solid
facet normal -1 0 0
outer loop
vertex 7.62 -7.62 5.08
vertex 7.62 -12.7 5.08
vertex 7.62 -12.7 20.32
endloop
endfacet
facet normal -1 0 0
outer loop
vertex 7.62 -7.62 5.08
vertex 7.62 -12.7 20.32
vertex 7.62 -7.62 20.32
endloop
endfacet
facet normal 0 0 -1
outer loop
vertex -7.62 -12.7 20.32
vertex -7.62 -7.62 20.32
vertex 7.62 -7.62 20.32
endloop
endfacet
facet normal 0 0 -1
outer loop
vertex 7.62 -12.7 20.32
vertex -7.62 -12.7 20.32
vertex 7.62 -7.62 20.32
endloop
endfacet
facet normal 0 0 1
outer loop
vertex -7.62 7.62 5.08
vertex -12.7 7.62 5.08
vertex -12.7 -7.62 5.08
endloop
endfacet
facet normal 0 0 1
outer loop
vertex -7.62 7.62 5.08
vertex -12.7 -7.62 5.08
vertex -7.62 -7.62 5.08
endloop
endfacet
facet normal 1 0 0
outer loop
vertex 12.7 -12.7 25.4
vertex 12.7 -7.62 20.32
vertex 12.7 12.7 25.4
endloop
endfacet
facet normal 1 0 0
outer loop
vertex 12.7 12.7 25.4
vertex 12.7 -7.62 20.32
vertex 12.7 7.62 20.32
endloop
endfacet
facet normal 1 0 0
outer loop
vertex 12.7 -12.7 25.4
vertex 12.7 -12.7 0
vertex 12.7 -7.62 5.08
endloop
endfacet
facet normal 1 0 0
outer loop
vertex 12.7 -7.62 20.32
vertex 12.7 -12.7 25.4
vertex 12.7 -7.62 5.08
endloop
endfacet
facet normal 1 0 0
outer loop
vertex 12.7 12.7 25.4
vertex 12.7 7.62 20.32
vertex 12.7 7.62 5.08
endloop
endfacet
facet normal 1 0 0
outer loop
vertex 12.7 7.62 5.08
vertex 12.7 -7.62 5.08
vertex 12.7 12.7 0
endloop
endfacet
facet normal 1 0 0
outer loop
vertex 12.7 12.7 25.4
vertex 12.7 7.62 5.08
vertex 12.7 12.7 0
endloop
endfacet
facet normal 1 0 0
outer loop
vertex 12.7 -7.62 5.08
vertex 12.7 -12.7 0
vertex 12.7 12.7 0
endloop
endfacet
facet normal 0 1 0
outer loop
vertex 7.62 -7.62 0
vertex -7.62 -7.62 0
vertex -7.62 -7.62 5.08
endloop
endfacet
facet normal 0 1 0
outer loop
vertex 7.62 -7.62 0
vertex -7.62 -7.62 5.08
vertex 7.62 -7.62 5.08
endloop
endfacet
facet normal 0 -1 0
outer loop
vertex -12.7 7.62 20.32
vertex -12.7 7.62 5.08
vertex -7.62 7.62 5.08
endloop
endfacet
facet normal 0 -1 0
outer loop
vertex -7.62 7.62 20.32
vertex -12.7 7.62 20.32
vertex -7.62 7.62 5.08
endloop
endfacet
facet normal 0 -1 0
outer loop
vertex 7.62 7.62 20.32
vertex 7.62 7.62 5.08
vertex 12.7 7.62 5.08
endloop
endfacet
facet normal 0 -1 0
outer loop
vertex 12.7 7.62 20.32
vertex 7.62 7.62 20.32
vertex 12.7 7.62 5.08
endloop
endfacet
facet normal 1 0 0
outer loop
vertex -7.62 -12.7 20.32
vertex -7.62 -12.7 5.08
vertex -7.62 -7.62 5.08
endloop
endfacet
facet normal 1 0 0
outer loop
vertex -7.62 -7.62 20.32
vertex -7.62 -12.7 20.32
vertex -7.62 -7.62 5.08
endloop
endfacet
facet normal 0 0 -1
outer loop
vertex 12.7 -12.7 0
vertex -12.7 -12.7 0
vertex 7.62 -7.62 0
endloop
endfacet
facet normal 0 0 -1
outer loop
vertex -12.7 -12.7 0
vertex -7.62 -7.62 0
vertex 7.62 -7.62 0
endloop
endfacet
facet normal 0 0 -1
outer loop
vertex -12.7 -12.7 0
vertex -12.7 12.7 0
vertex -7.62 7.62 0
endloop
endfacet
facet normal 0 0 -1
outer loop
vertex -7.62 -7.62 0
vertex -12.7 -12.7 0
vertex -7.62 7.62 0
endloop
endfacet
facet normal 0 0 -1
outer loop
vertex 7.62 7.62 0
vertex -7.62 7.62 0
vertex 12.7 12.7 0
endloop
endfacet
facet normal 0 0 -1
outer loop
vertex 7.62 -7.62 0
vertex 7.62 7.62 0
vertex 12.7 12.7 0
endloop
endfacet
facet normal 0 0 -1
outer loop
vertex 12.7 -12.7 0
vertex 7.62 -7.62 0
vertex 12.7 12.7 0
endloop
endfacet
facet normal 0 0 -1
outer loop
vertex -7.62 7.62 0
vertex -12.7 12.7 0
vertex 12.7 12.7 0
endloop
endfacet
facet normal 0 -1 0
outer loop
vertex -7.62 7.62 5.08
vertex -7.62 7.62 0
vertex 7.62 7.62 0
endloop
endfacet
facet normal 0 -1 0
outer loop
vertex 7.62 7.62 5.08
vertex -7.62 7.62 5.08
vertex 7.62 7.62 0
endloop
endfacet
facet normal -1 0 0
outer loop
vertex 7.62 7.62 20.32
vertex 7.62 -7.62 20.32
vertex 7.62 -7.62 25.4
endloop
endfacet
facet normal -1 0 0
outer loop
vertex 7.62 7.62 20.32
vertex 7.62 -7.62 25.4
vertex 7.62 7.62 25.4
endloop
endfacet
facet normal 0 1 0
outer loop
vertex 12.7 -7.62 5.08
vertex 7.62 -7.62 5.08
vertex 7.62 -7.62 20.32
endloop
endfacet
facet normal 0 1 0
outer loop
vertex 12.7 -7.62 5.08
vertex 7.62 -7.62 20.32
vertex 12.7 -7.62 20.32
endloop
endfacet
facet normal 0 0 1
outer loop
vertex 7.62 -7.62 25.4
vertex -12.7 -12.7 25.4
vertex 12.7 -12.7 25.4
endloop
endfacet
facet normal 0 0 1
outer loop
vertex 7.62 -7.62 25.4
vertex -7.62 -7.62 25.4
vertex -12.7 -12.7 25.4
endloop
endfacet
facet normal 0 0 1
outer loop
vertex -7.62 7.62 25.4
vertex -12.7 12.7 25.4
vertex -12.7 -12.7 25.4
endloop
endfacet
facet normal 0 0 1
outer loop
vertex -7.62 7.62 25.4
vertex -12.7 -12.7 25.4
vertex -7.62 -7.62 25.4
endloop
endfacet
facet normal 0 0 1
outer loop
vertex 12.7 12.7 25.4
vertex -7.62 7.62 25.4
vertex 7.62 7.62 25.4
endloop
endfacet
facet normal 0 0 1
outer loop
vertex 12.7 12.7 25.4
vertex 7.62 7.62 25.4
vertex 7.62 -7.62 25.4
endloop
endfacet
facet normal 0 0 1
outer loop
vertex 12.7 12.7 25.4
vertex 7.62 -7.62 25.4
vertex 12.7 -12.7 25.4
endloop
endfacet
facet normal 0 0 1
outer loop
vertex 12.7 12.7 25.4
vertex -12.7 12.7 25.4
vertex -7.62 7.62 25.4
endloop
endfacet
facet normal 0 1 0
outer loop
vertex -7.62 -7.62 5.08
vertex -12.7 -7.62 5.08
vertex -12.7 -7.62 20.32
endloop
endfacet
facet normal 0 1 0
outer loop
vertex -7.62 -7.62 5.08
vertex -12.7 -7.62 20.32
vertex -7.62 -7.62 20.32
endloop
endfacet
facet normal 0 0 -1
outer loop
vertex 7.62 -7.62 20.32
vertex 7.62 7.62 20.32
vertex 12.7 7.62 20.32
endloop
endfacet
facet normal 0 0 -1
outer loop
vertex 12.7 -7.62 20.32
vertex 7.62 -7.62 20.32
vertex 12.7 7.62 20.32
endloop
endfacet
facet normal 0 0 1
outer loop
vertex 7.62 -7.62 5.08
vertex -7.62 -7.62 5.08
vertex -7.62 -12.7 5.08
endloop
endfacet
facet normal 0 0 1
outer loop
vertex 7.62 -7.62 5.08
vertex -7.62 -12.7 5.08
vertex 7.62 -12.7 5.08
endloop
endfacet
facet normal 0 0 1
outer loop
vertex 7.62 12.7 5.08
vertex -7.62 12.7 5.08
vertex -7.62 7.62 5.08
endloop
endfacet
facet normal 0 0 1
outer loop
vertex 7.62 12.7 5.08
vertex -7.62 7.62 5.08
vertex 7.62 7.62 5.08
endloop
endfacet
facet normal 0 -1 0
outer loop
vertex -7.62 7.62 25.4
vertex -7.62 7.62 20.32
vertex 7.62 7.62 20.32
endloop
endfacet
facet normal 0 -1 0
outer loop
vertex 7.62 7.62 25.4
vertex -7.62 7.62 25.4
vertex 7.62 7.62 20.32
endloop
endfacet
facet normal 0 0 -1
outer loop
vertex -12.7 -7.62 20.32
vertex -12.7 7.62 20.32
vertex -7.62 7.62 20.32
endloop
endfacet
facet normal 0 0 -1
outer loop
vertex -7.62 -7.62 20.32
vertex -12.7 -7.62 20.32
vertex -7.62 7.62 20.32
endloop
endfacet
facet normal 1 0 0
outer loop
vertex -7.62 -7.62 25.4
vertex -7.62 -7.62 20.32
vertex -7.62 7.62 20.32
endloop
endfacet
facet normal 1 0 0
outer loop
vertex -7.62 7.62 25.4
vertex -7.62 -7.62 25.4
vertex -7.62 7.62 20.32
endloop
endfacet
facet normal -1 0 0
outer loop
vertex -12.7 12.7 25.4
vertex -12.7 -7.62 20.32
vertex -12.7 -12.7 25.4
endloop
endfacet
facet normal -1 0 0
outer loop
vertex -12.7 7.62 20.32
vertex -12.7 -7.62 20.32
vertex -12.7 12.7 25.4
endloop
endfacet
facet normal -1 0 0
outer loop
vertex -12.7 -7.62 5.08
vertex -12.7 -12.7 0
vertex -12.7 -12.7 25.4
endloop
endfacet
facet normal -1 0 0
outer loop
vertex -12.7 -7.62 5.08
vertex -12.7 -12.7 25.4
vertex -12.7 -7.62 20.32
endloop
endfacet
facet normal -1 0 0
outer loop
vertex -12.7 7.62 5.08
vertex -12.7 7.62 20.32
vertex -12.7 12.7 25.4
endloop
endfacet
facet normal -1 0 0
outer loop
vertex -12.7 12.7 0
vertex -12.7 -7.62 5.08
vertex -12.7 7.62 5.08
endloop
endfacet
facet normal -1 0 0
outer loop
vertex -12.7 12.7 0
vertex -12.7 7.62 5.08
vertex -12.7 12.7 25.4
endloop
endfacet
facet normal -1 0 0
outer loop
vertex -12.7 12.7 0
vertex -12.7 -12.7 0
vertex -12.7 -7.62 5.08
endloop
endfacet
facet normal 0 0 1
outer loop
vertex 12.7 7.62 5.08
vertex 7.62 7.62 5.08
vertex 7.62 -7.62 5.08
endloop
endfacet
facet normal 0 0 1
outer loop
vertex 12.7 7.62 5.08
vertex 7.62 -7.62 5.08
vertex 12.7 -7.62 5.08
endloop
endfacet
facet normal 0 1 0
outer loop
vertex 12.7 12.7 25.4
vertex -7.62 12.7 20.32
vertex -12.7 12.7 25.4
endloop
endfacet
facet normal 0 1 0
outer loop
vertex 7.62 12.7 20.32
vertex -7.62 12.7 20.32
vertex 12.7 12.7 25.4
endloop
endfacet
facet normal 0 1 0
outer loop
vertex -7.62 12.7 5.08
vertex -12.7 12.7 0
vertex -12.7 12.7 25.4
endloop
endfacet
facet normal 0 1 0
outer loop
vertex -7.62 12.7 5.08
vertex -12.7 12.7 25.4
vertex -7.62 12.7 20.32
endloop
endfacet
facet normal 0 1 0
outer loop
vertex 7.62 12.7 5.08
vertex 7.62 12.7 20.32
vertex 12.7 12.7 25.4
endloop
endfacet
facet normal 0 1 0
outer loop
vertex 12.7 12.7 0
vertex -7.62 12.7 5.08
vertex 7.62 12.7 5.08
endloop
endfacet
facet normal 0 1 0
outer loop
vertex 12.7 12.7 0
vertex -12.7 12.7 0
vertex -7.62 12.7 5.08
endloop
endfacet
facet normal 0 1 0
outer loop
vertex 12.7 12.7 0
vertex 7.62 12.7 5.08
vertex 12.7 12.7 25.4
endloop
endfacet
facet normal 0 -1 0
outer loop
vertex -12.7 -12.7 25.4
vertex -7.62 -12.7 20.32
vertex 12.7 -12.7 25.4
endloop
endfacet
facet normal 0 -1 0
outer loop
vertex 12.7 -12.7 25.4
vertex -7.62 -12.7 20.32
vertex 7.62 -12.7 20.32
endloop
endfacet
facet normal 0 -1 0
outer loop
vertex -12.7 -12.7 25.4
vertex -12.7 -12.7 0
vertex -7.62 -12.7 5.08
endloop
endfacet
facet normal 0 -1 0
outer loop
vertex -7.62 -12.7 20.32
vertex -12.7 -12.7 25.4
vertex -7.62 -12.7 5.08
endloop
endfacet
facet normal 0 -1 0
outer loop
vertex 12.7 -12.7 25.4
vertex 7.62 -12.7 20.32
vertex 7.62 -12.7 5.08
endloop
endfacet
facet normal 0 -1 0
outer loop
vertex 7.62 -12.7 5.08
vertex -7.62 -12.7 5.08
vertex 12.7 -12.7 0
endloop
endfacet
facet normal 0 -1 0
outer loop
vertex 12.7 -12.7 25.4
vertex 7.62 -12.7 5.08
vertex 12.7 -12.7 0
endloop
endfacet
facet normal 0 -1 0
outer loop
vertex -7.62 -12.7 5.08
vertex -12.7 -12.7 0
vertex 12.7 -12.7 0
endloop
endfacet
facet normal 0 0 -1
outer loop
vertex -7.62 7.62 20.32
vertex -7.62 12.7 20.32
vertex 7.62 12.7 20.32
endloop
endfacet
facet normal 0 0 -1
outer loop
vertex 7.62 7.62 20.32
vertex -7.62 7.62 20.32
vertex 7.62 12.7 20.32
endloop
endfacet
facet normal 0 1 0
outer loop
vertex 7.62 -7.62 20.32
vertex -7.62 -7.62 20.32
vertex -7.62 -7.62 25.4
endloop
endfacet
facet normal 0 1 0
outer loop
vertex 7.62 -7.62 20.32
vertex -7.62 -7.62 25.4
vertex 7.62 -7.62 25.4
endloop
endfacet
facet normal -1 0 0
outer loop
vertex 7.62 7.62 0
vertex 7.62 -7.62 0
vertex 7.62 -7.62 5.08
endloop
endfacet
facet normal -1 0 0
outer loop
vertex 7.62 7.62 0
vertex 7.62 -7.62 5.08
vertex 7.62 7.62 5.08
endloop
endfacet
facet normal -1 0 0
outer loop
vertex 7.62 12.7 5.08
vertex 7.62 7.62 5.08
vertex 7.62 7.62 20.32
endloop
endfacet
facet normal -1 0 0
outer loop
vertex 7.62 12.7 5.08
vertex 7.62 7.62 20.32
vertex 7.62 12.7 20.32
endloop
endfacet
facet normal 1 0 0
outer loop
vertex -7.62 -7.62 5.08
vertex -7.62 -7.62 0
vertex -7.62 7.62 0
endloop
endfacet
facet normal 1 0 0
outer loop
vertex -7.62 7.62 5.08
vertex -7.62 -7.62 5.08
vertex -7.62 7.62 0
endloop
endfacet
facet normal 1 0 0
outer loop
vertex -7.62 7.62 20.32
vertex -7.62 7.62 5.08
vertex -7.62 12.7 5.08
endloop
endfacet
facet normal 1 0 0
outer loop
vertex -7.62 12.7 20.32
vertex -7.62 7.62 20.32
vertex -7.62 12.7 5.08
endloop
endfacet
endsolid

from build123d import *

# Parameters (mm, degrees)
F0_W     = 25.4
F0_H     = 25.4
F0_W_2   = 15.24
F0_H_2   = 15.24
F1_DEPTH = 5.08
F2_W     = 5.08
F2_H     = 5.08
F3_DEPTH = 15.24
F4_W     = 25.4
F4_H     = 25.4
F4_W_2   = 15.24
F4_H_2   = 15.24
F5_DEPTH = 5.08


with BuildPart() as f1:
    # F0 (on Top) → F1 (new body)
    with BuildSketch(Plane.XY):
        Rectangle(F0_W, F0_H)
        Rectangle(F0_W_2, F0_H_2, mode=Mode.SUBTRACT)
    extrude(amount=F1_DEPTH)

    # F2 (on face) → F3 (join)
    with BuildSketch(Plane.XY.offset(5.08)):
        with Locations((-10.16, 10.16)):
            Rectangle(F2_W, F2_H)
        with Locations((10.16, 10.16)):
            Rectangle(F2_W, F2_H)
        with Locations((10.16, -10.16)):
            Rectangle(F2_W, F2_H)
        with Locations((-10.16, -10.16)):
            Rectangle(F2_W, F2_H)
    extrude(amount=F3_DEPTH)

    # F4 (on face) → F5 (join)
    with BuildSketch(Plane.XY.offset(20.32)):
        Rectangle(F4_W, F4_H)
        Rectangle(F4_W_2, F4_H_2, mode=Mode.SUBTRACT)
    extrude(amount=F5_DEPTH)


solid = f1.part
